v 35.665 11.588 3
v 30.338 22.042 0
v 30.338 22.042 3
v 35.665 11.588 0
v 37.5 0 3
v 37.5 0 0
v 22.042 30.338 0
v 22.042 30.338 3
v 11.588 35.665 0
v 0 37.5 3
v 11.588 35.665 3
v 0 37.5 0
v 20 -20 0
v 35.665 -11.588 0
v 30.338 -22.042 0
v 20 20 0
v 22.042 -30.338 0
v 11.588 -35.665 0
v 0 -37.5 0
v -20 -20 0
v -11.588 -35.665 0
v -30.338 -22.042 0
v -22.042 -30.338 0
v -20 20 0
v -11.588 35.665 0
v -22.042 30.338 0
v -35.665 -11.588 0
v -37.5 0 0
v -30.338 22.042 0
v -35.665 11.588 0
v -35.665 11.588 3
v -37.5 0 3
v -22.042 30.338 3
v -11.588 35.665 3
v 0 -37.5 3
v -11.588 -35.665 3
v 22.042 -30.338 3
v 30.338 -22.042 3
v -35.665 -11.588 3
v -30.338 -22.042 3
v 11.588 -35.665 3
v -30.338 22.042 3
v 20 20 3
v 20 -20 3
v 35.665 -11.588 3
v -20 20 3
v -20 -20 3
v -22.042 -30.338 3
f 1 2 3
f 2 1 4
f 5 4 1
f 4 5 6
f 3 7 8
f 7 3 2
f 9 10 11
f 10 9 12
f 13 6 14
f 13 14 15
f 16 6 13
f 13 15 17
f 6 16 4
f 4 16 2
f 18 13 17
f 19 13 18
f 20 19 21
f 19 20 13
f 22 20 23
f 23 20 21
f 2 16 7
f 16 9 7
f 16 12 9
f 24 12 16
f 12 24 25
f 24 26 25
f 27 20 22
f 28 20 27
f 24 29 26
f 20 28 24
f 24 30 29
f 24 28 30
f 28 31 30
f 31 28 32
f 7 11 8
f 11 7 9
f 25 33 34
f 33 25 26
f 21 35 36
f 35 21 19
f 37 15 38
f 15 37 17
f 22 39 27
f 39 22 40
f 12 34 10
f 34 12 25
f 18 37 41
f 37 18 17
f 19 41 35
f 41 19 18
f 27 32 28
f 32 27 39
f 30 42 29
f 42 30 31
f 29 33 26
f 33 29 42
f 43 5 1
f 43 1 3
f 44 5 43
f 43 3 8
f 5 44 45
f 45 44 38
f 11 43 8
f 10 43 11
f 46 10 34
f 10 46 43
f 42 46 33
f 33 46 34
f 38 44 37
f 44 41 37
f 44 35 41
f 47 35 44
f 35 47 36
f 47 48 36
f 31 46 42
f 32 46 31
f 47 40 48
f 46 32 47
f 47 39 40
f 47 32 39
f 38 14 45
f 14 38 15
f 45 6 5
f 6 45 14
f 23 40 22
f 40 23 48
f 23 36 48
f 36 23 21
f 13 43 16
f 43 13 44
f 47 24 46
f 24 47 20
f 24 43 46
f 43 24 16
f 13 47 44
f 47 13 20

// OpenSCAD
$fn = 20;
difference() {
  cylinder(3, d=75);
  cube([40, 40, 100], true);
}
